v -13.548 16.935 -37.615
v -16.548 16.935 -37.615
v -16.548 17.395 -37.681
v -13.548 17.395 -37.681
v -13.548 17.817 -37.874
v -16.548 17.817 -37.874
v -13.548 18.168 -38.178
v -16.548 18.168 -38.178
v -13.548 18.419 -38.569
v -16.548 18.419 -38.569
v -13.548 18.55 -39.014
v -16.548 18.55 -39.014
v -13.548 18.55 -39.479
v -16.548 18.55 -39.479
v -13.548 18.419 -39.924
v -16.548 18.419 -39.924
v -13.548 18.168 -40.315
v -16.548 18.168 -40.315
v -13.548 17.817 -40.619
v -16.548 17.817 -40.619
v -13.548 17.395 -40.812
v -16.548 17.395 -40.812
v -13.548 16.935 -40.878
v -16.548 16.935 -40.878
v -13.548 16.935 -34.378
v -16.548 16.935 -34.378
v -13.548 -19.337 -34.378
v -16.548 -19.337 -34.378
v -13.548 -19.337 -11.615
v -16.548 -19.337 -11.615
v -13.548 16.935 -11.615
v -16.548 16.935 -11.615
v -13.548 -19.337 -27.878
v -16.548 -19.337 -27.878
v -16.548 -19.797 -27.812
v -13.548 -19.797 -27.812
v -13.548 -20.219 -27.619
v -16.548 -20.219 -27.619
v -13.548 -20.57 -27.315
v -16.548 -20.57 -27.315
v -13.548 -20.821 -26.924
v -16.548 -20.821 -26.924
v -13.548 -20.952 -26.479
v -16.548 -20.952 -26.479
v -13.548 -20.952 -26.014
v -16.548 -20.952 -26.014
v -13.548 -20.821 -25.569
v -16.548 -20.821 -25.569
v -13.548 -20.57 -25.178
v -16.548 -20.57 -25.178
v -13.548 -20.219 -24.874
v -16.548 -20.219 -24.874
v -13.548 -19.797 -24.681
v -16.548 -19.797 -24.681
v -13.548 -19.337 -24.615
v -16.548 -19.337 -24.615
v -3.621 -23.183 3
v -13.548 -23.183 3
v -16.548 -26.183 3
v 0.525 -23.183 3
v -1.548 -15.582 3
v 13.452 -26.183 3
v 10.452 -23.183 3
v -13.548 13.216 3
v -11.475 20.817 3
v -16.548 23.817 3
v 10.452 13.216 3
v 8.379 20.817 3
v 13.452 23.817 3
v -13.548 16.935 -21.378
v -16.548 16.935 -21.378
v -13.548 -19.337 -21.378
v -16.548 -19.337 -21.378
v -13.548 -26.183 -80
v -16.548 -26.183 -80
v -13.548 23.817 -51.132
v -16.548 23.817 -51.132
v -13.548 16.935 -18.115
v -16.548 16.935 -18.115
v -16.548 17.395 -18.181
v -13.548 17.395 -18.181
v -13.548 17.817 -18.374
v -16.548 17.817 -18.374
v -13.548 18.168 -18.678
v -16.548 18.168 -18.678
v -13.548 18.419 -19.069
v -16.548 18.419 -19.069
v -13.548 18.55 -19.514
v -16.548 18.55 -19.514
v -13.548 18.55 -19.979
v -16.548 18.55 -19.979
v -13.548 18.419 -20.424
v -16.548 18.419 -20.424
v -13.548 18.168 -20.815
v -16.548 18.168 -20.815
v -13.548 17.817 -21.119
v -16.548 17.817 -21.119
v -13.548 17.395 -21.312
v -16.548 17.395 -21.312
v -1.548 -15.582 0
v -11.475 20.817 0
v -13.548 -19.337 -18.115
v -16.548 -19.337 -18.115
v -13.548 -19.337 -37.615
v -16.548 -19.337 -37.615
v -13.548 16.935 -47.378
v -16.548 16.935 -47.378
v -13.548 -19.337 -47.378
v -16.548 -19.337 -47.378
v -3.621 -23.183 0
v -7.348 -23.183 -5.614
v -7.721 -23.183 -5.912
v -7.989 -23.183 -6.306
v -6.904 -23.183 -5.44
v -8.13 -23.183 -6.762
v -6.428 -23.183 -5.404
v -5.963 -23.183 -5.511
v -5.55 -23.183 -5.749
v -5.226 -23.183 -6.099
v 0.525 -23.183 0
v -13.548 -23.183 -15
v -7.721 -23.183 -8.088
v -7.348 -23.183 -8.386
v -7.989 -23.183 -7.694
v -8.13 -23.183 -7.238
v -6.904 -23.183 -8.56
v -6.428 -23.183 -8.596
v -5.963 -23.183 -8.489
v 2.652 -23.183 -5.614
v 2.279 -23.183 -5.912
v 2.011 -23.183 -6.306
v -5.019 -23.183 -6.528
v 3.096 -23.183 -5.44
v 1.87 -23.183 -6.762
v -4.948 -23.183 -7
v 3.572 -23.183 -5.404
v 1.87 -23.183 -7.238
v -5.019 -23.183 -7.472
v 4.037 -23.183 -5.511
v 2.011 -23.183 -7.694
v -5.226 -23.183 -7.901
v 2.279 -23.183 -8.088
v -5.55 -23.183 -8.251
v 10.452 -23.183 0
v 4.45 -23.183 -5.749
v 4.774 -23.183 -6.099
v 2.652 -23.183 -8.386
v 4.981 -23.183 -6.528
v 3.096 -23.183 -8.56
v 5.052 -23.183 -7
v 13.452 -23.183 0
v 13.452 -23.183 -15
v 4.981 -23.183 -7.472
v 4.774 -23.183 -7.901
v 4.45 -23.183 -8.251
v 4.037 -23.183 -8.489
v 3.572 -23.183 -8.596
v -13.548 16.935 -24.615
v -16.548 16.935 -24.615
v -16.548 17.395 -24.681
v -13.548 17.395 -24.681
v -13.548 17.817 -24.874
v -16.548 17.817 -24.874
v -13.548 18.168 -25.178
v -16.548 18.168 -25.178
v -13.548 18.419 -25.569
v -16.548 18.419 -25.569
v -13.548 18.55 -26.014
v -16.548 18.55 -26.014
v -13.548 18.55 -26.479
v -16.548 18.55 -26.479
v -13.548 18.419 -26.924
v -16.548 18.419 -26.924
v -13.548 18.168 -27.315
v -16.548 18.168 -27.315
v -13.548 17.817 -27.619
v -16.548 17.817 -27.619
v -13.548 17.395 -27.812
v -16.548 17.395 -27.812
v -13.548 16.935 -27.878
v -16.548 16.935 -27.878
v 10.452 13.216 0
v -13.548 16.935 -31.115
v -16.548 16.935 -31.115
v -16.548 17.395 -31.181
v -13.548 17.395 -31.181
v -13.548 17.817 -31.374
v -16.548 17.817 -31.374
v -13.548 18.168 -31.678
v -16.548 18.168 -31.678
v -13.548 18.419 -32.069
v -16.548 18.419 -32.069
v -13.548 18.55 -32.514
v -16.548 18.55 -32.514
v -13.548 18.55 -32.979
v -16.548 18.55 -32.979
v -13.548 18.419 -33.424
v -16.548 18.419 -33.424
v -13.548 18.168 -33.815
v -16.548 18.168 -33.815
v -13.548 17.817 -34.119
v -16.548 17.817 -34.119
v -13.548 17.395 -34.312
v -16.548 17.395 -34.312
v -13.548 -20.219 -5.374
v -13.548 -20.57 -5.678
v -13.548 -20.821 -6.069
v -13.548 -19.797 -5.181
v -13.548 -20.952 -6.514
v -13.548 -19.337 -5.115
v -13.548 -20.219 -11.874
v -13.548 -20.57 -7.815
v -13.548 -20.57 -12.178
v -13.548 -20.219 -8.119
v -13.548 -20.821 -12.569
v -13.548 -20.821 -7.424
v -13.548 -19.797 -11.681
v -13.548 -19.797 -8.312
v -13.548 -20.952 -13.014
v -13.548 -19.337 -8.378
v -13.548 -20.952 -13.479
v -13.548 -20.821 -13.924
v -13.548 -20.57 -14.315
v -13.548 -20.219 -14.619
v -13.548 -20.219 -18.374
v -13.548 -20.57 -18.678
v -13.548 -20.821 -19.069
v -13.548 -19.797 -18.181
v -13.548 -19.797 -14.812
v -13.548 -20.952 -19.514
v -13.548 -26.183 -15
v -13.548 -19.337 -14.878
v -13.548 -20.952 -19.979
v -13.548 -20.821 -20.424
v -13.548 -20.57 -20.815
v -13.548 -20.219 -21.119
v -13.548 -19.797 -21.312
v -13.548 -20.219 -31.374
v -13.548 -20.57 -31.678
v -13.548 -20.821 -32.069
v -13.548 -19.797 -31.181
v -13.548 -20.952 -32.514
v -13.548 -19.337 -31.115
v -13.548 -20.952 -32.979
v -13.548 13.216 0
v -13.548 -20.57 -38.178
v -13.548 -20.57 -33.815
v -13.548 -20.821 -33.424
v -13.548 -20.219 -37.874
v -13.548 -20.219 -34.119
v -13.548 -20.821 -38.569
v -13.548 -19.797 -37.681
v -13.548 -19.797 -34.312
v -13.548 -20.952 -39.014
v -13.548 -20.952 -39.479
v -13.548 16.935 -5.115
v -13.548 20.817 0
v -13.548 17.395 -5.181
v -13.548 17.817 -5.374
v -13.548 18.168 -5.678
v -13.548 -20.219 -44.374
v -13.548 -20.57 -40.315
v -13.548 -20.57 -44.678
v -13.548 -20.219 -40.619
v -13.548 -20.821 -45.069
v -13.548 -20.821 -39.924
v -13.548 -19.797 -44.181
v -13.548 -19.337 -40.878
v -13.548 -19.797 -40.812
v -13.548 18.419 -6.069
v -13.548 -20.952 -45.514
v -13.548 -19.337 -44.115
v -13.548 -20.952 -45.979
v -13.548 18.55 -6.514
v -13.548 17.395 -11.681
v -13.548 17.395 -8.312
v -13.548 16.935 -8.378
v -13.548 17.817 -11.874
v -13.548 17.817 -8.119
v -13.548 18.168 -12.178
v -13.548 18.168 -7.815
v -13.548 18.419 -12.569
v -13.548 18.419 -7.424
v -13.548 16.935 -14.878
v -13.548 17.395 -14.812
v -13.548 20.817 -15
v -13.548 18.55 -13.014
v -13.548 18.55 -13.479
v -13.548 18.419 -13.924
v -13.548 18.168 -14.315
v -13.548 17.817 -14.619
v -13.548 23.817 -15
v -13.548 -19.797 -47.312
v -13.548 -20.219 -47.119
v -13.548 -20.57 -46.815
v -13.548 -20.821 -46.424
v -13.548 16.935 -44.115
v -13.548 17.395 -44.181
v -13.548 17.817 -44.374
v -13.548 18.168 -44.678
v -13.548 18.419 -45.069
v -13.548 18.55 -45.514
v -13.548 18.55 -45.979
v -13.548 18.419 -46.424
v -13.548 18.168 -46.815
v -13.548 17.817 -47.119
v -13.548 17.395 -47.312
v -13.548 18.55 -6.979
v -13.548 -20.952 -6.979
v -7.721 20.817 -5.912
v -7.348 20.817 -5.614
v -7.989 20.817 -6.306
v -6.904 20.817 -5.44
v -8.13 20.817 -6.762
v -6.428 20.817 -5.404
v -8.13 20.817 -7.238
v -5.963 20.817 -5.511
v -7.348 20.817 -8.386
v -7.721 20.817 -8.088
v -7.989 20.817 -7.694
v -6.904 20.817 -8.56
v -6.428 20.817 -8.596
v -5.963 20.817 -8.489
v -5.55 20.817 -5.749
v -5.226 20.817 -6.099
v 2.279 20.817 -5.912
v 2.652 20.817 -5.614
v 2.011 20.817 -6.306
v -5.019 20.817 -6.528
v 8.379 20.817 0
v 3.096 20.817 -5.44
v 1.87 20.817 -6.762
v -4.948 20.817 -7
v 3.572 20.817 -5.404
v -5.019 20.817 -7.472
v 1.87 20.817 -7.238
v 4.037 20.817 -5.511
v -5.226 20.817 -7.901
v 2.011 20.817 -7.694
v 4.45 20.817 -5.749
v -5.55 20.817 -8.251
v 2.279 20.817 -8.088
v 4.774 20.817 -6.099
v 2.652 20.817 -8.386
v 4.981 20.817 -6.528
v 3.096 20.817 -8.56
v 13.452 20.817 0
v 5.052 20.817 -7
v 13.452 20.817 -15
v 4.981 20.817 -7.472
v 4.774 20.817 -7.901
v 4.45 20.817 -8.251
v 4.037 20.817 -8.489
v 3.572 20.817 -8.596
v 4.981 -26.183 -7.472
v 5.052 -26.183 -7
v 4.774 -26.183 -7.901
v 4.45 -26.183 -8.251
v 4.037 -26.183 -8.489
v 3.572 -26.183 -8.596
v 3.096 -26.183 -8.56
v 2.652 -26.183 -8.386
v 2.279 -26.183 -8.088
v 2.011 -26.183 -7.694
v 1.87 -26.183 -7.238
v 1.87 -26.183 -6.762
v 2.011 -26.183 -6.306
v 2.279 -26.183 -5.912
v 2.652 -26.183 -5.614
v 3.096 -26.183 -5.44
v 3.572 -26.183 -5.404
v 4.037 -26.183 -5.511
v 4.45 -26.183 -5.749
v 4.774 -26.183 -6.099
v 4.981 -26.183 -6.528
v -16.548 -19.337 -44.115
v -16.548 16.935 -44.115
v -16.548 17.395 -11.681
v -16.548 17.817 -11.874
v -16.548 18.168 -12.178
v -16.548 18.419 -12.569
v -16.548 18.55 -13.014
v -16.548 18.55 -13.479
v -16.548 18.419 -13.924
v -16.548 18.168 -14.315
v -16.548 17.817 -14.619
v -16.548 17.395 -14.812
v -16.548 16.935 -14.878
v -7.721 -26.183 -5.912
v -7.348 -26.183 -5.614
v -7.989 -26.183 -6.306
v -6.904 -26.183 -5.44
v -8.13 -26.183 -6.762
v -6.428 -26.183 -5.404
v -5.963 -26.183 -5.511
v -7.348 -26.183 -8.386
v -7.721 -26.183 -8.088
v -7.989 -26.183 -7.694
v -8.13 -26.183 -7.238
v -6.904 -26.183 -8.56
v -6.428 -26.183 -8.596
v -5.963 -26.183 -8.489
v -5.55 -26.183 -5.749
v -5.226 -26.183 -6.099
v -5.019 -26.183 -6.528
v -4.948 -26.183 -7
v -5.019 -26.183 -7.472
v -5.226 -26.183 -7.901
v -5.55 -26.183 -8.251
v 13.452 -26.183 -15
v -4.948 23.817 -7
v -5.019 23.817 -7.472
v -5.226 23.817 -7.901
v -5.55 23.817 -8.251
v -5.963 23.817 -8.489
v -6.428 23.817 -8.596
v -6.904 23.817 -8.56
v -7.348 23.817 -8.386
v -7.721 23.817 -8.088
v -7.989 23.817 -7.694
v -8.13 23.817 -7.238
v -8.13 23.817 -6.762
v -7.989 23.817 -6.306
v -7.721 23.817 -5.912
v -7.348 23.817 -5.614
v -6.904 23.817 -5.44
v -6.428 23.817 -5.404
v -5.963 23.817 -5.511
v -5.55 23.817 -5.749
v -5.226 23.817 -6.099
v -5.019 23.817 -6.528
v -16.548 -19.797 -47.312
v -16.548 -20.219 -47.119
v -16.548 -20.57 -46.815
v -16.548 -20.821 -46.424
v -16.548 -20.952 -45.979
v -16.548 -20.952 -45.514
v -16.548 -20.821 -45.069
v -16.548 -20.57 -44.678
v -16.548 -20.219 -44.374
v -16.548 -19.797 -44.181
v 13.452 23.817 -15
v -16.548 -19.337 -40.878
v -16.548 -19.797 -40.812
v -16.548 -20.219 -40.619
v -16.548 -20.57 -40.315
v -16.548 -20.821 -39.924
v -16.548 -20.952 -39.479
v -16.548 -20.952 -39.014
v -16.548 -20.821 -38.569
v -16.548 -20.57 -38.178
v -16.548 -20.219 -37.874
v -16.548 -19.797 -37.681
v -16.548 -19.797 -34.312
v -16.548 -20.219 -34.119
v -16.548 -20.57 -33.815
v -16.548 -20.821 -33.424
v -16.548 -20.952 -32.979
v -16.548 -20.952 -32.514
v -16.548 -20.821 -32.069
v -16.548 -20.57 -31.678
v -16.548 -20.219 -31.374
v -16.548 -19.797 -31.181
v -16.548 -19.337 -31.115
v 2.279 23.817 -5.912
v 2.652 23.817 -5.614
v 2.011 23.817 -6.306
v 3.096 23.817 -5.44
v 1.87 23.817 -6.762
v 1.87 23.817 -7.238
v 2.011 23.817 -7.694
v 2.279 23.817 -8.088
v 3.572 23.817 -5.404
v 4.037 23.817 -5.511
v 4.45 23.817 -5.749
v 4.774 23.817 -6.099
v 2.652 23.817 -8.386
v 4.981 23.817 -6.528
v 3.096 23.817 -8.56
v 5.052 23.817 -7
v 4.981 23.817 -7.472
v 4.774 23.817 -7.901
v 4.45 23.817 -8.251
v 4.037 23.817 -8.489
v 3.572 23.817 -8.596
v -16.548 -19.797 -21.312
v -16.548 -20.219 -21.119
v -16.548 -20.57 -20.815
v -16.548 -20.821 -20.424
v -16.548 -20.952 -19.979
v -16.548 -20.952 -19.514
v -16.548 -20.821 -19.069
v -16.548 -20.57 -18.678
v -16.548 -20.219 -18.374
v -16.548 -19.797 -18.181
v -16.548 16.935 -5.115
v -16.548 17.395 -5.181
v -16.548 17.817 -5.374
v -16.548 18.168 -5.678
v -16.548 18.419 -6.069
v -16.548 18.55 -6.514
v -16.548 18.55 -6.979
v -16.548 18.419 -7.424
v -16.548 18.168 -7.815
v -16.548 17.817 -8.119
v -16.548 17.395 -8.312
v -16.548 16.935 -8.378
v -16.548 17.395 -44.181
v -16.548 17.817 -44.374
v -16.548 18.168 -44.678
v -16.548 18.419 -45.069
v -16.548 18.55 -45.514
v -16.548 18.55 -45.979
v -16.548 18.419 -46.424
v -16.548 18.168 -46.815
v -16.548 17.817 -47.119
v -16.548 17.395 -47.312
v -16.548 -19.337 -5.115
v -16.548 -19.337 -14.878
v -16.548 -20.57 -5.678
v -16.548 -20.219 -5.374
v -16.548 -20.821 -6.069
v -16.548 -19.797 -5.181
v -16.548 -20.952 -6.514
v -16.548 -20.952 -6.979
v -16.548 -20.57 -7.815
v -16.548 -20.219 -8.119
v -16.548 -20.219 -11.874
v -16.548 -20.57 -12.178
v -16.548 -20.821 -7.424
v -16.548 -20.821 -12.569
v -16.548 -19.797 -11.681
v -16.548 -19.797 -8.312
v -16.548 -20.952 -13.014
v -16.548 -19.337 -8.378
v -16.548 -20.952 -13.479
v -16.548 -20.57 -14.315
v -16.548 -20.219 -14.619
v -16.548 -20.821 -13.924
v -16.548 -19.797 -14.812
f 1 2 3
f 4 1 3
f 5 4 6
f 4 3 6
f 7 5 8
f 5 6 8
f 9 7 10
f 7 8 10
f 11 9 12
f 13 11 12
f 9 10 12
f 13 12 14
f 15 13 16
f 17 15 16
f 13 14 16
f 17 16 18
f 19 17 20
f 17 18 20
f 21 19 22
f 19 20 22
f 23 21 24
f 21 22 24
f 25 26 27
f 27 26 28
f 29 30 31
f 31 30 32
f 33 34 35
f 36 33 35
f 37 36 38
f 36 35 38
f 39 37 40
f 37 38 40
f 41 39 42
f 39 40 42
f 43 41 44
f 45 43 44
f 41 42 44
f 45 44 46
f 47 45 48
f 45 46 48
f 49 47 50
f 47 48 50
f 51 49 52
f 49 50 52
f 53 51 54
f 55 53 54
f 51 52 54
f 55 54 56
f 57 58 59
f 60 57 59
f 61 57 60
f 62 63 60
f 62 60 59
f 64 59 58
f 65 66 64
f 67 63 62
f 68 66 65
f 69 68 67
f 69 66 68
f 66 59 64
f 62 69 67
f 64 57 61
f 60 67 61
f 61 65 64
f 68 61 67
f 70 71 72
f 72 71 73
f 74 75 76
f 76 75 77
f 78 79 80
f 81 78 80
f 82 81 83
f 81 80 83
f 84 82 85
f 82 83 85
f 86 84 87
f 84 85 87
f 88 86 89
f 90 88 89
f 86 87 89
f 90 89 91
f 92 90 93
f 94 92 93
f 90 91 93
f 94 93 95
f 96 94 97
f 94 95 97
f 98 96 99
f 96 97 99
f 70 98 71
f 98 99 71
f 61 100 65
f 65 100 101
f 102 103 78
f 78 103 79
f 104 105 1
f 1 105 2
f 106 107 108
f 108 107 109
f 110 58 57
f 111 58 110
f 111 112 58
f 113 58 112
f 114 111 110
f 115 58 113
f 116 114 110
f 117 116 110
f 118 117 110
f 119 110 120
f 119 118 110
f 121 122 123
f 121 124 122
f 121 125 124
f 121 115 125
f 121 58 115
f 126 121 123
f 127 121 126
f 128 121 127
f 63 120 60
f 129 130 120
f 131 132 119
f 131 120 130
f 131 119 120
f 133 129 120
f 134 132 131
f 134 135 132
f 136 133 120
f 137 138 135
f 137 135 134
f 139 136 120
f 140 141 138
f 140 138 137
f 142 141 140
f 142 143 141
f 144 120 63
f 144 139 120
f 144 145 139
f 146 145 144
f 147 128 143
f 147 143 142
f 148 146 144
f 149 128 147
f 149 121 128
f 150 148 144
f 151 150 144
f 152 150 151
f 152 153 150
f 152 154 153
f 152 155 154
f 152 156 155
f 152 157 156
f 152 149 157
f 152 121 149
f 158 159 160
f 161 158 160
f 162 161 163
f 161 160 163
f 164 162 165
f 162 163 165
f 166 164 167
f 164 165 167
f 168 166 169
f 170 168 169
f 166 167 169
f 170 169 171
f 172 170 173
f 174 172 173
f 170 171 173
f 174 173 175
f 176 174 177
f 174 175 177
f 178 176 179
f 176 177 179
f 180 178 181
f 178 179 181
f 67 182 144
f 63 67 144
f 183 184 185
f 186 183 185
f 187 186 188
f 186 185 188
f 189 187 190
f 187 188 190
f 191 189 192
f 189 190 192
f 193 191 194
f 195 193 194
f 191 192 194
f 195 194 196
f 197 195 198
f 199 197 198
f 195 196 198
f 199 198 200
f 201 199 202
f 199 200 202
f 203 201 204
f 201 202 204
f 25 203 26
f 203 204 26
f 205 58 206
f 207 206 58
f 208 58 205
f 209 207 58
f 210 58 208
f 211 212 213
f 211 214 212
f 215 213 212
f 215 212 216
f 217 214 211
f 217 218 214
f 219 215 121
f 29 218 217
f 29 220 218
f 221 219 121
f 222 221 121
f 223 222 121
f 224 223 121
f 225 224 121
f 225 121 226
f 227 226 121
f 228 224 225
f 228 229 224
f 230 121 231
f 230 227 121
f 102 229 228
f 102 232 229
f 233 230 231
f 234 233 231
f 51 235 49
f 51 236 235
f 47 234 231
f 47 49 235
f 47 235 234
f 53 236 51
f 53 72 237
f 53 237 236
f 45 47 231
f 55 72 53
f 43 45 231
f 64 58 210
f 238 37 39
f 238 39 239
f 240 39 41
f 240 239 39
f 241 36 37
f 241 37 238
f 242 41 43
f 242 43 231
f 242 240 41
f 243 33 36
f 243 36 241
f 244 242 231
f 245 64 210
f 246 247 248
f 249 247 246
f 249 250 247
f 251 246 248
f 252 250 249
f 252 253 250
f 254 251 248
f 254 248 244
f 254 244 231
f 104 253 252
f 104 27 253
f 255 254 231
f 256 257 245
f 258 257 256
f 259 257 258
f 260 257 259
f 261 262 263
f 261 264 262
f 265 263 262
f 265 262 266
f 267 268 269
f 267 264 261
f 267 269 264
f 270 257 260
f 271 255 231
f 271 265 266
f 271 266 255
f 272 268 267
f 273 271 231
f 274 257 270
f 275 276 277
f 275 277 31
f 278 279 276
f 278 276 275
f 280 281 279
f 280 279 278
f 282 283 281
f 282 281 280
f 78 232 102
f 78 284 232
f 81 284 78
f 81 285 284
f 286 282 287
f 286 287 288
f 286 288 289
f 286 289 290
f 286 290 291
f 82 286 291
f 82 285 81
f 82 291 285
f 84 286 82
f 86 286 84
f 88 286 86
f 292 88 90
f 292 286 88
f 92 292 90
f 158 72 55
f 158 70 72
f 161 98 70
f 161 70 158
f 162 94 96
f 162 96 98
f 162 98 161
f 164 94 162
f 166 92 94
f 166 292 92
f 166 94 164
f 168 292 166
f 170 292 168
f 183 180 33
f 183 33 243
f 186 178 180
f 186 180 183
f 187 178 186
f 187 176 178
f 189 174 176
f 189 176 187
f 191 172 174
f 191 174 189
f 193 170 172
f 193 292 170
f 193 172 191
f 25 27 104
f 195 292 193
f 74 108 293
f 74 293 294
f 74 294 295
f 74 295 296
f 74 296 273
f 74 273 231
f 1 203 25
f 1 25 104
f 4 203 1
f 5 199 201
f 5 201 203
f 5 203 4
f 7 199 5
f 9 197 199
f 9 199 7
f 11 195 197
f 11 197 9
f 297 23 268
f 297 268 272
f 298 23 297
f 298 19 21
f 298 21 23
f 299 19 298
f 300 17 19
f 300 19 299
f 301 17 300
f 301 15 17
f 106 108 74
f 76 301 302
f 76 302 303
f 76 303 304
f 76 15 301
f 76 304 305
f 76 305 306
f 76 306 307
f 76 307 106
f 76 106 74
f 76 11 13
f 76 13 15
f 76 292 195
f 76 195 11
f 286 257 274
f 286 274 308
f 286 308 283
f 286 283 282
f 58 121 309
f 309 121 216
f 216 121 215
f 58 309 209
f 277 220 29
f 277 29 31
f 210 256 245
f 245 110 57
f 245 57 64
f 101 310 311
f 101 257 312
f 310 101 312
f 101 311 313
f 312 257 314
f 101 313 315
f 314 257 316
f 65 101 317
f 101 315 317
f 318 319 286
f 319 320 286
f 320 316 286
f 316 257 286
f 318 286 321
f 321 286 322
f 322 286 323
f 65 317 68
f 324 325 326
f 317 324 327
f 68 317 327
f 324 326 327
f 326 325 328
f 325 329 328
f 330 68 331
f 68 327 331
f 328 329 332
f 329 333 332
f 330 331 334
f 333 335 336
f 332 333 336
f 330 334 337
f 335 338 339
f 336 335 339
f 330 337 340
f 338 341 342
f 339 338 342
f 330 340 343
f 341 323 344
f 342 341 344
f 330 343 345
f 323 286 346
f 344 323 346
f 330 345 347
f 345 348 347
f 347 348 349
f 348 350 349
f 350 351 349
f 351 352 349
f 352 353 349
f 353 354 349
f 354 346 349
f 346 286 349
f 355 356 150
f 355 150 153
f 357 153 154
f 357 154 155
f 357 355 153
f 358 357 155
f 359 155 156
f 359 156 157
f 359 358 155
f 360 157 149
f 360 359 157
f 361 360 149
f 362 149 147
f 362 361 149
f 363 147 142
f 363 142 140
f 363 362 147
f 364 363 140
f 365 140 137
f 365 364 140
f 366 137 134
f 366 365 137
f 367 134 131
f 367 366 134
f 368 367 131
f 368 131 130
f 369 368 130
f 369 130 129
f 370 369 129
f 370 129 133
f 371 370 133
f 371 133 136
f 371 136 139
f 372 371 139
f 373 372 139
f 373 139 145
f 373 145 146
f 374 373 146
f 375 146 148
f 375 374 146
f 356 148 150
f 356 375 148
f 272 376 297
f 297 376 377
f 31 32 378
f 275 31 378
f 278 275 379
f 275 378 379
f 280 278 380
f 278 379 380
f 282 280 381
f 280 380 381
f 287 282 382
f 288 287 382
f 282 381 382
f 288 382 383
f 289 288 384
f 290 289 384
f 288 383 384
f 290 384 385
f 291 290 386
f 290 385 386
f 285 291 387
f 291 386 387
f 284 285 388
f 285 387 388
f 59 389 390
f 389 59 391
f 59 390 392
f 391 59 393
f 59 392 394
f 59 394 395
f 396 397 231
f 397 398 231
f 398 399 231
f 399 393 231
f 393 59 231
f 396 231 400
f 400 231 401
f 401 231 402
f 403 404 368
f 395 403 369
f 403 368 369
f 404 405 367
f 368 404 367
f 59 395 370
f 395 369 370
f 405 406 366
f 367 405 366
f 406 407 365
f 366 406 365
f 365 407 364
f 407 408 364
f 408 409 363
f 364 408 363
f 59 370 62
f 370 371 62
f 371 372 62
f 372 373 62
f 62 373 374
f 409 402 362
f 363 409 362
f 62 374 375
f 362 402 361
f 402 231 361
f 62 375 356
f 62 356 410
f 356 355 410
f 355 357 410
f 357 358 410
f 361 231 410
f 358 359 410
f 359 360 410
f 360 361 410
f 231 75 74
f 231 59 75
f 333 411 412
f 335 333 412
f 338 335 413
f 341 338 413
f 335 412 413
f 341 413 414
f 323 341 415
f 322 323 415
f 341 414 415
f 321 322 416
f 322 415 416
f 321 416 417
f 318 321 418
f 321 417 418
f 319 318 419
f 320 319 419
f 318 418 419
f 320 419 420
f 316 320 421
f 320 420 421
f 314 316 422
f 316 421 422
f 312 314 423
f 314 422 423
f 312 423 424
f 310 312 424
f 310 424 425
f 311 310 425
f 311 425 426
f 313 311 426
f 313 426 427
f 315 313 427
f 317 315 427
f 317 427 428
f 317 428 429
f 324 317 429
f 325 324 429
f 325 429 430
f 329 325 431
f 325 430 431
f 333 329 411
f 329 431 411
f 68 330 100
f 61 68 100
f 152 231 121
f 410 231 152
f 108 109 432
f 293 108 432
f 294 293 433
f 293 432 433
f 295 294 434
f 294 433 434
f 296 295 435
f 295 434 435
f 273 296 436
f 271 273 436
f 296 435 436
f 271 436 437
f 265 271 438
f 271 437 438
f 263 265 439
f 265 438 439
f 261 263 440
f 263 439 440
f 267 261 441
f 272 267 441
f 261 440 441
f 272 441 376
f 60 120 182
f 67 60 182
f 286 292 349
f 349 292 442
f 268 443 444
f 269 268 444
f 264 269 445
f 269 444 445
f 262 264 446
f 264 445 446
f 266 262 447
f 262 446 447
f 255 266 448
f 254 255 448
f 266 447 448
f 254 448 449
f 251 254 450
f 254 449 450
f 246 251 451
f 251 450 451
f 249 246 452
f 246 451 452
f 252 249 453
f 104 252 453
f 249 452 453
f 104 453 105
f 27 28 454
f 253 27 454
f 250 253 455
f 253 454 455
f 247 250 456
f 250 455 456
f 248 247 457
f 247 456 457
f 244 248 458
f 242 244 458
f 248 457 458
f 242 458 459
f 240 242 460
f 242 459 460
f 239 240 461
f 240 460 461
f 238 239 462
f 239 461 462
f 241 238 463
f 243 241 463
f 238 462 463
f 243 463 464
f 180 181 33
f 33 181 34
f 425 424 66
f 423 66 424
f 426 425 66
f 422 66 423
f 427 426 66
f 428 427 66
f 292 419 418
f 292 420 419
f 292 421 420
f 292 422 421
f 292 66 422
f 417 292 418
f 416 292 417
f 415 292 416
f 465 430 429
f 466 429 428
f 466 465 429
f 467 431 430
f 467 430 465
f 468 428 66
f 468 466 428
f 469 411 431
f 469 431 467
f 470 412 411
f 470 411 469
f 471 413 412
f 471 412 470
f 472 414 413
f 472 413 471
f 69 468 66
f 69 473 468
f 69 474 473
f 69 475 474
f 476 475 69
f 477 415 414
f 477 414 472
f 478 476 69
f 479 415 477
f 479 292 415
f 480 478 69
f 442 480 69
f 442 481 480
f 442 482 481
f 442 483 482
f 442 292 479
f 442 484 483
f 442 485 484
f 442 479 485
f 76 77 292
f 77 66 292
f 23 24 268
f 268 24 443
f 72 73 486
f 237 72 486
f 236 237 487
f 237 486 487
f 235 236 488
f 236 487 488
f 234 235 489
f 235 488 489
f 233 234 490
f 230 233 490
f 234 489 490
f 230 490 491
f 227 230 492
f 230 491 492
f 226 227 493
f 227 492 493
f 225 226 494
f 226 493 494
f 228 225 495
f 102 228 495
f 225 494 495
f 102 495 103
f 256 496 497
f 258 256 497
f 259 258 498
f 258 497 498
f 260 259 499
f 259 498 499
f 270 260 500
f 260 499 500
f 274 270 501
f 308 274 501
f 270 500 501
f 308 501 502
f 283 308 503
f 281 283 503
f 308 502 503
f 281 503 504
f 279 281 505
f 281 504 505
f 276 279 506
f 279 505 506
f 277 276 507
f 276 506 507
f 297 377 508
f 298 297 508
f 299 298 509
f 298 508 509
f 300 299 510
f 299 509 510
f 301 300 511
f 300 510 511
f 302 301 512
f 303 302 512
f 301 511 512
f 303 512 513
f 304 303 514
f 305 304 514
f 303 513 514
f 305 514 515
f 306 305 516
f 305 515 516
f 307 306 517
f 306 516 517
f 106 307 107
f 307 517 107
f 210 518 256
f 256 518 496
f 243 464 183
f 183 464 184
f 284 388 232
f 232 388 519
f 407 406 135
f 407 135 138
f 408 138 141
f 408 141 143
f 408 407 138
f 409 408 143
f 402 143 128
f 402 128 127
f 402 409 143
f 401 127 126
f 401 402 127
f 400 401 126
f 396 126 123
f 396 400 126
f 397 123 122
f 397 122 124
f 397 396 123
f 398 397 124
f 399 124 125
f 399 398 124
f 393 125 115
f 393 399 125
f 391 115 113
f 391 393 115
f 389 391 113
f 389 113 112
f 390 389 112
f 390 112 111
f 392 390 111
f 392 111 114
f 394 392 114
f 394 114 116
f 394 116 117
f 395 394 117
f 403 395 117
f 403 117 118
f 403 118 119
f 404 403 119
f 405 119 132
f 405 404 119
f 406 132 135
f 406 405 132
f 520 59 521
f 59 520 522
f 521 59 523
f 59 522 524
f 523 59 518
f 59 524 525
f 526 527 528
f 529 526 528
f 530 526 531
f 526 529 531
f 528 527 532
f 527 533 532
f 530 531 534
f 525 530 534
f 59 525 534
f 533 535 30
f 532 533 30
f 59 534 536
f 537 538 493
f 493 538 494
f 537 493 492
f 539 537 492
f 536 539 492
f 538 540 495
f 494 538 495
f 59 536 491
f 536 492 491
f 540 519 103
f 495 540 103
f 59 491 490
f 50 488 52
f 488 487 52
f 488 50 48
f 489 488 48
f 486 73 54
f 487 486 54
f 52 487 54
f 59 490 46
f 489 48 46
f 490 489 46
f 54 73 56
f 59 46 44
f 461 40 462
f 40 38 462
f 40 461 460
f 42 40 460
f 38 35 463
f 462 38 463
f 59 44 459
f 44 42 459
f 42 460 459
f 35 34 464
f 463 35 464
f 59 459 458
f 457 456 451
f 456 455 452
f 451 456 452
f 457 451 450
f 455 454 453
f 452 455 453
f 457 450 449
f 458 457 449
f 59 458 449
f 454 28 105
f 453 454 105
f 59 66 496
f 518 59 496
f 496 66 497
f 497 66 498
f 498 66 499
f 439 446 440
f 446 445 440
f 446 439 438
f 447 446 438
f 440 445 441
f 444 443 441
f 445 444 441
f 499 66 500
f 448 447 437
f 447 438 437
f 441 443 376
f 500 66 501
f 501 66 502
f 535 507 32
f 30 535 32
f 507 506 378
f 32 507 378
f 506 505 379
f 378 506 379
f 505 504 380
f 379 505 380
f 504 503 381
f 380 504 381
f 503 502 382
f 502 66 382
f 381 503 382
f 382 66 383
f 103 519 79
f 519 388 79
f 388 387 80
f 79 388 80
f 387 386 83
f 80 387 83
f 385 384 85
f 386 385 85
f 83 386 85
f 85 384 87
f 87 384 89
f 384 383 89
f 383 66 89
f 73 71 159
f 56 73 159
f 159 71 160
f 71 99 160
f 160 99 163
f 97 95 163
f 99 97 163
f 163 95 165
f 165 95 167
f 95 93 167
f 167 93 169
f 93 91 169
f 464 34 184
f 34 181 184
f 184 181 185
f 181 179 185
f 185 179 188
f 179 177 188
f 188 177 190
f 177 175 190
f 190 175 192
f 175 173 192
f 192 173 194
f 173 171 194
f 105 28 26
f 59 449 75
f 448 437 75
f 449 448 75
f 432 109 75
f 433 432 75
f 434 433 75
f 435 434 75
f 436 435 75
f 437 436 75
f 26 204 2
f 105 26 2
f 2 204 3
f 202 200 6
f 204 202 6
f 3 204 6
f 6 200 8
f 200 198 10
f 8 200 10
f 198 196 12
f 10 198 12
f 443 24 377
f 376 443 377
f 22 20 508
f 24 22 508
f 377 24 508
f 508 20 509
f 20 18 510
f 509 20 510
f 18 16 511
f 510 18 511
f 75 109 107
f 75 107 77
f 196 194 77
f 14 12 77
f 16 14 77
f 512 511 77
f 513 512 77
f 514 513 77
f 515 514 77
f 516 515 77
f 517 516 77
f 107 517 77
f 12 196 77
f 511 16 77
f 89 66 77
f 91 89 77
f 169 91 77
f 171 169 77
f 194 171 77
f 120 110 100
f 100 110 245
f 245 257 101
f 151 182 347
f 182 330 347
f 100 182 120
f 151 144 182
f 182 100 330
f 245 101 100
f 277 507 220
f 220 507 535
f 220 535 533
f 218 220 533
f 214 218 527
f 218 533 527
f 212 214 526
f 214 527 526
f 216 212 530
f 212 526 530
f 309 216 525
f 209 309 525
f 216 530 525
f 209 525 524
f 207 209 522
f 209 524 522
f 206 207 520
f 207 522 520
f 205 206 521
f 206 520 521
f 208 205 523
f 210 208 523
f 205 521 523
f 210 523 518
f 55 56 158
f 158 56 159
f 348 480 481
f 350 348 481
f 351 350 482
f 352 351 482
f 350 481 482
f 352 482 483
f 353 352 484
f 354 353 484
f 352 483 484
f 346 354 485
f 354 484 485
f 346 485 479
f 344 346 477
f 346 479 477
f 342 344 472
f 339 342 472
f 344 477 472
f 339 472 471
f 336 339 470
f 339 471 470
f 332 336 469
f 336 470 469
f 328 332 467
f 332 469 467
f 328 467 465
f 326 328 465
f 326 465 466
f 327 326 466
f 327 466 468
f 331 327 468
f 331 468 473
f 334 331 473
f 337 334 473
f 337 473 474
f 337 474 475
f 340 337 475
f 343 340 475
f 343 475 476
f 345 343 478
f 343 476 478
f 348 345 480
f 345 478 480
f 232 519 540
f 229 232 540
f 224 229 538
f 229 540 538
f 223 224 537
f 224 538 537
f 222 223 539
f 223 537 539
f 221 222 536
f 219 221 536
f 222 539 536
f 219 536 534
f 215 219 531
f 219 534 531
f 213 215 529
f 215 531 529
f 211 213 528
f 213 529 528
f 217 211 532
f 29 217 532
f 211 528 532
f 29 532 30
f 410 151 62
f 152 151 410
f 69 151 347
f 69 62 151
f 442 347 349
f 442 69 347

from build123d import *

# Parameters (mm, degrees)
SKETCH_1_W      = 30
SKETCH_1_H      = 50
EXTRUDE_1_DEPTH = 3
EXTRUDE_3_DEPTH = 3
EXTRUDE_START   = -50
SKETCH_3_W      = 27
SKETCH_3_H      = 15
SKETCH_3_R      = 1.6
EXTRUDE_4_DEPTH = 3
SKETCH_5_W      = 27
SKETCH_5_H      = 15
SKETCH_5_R      = 1.6
EXTRUDE_5_DEPTH = 3


with BuildPart() as part:
    # 草图1 → 凸台-拉伸1 (new body)
    with BuildSketch(Plane.XY):
        with Locations((-1.547723223, -1.182673383)):
            Rectangle(SKETCH_1_W, SKETCH_1_H)
        Polygon((-13.547723223, 13.216157116), (-13.547723223, -23.182673383), (-3.620769451, -23.182673383), align=None, mode=Mode.SUBTRACT)
        Polygon((10.452276777, 13.216157116), (10.452276777, -23.182673383), (0.525323004, -23.182673383), align=None, mode=Mode.SUBTRACT)
        Polygon((-11.474676996, 20.817326617), (8.379230549, 20.817326617), (-1.547723223, -15.581503883), align=None, mode=Mode.SUBTRACT)
    extrude(amount=EXTRUDE_1_DEPTH)

    # 草图2 → 凸台-拉伸3 (add)
    with BuildSketch(Plane.ZY.offset(16.547723223)):
        Polygon((-80, -26.182673383), (-51.132486541, 23.817326617), (0, 23.817326617), (0, -26.182673383), align=None)
        Polygon((-3, -23.182673383), (-3, 20.817326617), (-49.400435733, 20.817326617), (-74.803847577, -23.182673383), align=None, mode=Mode.SUBTRACT)
        Polygon((-3, -23.182673383), (-74.803847577, -23.182673383), (-49.400435733, 20.817326617), (-3, 20.817326617), align=None)
        with BuildLine():
            ThreePointArc((-8.378224309, -19.337056165), (-6.74645341, -20.968827063), (-5.114682512, -19.337056165))
            Line((-5.114682512, -19.337056165), (-5.114682512, 16.93515829))
            ThreePointArc((-5.114682512, 16.93515829), (-6.74645341, 18.566929189), (-8.378224309, 16.93515829))
            Line((-8.378224309, 16.93515829), (-8.378224309, -19.337056165))
        make_face(mode=Mode.SUBTRACT)
        with BuildLine():
            ThreePointArc((-14.878224309, -19.337056165), (-13.24645341, -20.968827063), (-11.614682512, -19.337056165))
            Line((-11.614682512, -19.337056165), (-11.614682512, 16.93515829))
            ThreePointArc((-11.614682512, 16.93515829), (-13.24645341, 18.566929189), (-14.878224309, 16.93515829))
            Line((-14.878224309, 16.93515829), (-14.878224309, -19.337056165))
        make_face(mode=Mode.SUBTRACT)
        with BuildLine():
            ThreePointArc((-21.378224309, -19.337056165), (-19.74645341, -20.968827063), (-18.114682512, -19.337056165))
            Line((-18.114682512, -19.337056165), (-18.114682512, 16.93515829))
            ThreePointArc((-18.114682512, 16.93515829), (-19.74645341, 18.566929189), (-21.378224309, 16.93515829))
            Line((-21.378224309, 16.93515829), (-21.378224309, -19.337056165))
        make_face(mode=Mode.SUBTRACT)
        with BuildLine():
            ThreePointArc((-27.878224309, -19.337056165), (-26.24645341, -20.968827063), (-24.614682512, -19.337056165))
            Line((-24.614682512, -19.337056165), (-24.614682512, 16.93515829))
            ThreePointArc((-24.614682512, 16.93515829), (-26.24645341, 18.566929189), (-27.878224309, 16.93515829))
            Line((-27.878224309, 16.93515829), (-27.878224309, -19.337056165))
        make_face(mode=Mode.SUBTRACT)
        with BuildLine():
            ThreePointArc((-34.378224309, -19.337056165), (-32.74645341, -20.968827063), (-31.114682512, -19.337056165))
            Line((-31.114682512, -19.337056165), (-31.114682512, 16.93515829))
            ThreePointArc((-31.114682512, 16.93515829), (-32.74645341, 18.566929189), (-34.378224309, 16.93515829))
            Line((-34.378224309, 16.93515829), (-34.378224309, -19.337056165))
        make_face(mode=Mode.SUBTRACT)
        with BuildLine():
            ThreePointArc((-40.878224309, -19.337056165), (-39.24645341, -20.968827063), (-37.614682512, -19.337056165))
            Line((-37.614682512, -19.337056165), (-37.614682512, 16.93515829))
            ThreePointArc((-37.614682512, 16.93515829), (-39.24645341, 18.566929189), (-40.878224309, 16.93515829))
            Line((-40.878224309, 16.93515829), (-40.878224309, -19.337056165))
        make_face(mode=Mode.SUBTRACT)
        with BuildLine():
            ThreePointArc((-47.378224309, -19.337056165), (-45.74645341, -20.968827063), (-44.114682512, -19.337056165))
            Line((-44.114682512, -19.337056165), (-44.114682512, 16.93515829))
            ThreePointArc((-44.114682512, 16.93515829), (-45.74645341, 18.566929189), (-47.378224309, 16.93515829))
            Line((-47.378224309, 16.93515829), (-47.378224309, -19.337056165))
        make_face(mode=Mode.SUBTRACT)
    extrude(amount=-EXTRUDE_3_DEPTH)

    # 草图3 → 凸台-拉伸4 (add)
    with BuildSketch(Plane(origin=(0, 23.817326617, 0), x_dir=(1, 0, 0), z_dir=(0, 1, 0)).offset(EXTRUDE_START)):
        with Locations((-0.047723223, 7.5)):
            Rectangle(SKETCH_3_W, SKETCH_3_H)
        with Locations((-6.547723223, 7)):
            Circle(SKETCH_3_R, mode=Mode.SUBTRACT)
        with Locations((3.452276777, 7)):
            Circle(SKETCH_3_R, mode=Mode.SUBTRACT)
    extrude(amount=EXTRUDE_4_DEPTH)

    # 草图5 → 凸台-拉伸5 (add)
    with BuildSketch(Plane(origin=(0, 23.817326617, 0), x_dir=(1, 0, 0), z_dir=(0, 1, 0))):
        with Locations((-0.047723223, 7.5)):
            Rectangle(SKETCH_5_W, SKETCH_5_H)
        with Locations((-6.547723223, 7)):
            Circle(SKETCH_5_R, mode=Mode.SUBTRACT)
        with Locations((3.452276777, 7)):
            Circle(SKETCH_5_R, mode=Mode.SUBTRACT)
    extrude(amount=-EXTRUDE_5_DEPTH)


solid = part.part
